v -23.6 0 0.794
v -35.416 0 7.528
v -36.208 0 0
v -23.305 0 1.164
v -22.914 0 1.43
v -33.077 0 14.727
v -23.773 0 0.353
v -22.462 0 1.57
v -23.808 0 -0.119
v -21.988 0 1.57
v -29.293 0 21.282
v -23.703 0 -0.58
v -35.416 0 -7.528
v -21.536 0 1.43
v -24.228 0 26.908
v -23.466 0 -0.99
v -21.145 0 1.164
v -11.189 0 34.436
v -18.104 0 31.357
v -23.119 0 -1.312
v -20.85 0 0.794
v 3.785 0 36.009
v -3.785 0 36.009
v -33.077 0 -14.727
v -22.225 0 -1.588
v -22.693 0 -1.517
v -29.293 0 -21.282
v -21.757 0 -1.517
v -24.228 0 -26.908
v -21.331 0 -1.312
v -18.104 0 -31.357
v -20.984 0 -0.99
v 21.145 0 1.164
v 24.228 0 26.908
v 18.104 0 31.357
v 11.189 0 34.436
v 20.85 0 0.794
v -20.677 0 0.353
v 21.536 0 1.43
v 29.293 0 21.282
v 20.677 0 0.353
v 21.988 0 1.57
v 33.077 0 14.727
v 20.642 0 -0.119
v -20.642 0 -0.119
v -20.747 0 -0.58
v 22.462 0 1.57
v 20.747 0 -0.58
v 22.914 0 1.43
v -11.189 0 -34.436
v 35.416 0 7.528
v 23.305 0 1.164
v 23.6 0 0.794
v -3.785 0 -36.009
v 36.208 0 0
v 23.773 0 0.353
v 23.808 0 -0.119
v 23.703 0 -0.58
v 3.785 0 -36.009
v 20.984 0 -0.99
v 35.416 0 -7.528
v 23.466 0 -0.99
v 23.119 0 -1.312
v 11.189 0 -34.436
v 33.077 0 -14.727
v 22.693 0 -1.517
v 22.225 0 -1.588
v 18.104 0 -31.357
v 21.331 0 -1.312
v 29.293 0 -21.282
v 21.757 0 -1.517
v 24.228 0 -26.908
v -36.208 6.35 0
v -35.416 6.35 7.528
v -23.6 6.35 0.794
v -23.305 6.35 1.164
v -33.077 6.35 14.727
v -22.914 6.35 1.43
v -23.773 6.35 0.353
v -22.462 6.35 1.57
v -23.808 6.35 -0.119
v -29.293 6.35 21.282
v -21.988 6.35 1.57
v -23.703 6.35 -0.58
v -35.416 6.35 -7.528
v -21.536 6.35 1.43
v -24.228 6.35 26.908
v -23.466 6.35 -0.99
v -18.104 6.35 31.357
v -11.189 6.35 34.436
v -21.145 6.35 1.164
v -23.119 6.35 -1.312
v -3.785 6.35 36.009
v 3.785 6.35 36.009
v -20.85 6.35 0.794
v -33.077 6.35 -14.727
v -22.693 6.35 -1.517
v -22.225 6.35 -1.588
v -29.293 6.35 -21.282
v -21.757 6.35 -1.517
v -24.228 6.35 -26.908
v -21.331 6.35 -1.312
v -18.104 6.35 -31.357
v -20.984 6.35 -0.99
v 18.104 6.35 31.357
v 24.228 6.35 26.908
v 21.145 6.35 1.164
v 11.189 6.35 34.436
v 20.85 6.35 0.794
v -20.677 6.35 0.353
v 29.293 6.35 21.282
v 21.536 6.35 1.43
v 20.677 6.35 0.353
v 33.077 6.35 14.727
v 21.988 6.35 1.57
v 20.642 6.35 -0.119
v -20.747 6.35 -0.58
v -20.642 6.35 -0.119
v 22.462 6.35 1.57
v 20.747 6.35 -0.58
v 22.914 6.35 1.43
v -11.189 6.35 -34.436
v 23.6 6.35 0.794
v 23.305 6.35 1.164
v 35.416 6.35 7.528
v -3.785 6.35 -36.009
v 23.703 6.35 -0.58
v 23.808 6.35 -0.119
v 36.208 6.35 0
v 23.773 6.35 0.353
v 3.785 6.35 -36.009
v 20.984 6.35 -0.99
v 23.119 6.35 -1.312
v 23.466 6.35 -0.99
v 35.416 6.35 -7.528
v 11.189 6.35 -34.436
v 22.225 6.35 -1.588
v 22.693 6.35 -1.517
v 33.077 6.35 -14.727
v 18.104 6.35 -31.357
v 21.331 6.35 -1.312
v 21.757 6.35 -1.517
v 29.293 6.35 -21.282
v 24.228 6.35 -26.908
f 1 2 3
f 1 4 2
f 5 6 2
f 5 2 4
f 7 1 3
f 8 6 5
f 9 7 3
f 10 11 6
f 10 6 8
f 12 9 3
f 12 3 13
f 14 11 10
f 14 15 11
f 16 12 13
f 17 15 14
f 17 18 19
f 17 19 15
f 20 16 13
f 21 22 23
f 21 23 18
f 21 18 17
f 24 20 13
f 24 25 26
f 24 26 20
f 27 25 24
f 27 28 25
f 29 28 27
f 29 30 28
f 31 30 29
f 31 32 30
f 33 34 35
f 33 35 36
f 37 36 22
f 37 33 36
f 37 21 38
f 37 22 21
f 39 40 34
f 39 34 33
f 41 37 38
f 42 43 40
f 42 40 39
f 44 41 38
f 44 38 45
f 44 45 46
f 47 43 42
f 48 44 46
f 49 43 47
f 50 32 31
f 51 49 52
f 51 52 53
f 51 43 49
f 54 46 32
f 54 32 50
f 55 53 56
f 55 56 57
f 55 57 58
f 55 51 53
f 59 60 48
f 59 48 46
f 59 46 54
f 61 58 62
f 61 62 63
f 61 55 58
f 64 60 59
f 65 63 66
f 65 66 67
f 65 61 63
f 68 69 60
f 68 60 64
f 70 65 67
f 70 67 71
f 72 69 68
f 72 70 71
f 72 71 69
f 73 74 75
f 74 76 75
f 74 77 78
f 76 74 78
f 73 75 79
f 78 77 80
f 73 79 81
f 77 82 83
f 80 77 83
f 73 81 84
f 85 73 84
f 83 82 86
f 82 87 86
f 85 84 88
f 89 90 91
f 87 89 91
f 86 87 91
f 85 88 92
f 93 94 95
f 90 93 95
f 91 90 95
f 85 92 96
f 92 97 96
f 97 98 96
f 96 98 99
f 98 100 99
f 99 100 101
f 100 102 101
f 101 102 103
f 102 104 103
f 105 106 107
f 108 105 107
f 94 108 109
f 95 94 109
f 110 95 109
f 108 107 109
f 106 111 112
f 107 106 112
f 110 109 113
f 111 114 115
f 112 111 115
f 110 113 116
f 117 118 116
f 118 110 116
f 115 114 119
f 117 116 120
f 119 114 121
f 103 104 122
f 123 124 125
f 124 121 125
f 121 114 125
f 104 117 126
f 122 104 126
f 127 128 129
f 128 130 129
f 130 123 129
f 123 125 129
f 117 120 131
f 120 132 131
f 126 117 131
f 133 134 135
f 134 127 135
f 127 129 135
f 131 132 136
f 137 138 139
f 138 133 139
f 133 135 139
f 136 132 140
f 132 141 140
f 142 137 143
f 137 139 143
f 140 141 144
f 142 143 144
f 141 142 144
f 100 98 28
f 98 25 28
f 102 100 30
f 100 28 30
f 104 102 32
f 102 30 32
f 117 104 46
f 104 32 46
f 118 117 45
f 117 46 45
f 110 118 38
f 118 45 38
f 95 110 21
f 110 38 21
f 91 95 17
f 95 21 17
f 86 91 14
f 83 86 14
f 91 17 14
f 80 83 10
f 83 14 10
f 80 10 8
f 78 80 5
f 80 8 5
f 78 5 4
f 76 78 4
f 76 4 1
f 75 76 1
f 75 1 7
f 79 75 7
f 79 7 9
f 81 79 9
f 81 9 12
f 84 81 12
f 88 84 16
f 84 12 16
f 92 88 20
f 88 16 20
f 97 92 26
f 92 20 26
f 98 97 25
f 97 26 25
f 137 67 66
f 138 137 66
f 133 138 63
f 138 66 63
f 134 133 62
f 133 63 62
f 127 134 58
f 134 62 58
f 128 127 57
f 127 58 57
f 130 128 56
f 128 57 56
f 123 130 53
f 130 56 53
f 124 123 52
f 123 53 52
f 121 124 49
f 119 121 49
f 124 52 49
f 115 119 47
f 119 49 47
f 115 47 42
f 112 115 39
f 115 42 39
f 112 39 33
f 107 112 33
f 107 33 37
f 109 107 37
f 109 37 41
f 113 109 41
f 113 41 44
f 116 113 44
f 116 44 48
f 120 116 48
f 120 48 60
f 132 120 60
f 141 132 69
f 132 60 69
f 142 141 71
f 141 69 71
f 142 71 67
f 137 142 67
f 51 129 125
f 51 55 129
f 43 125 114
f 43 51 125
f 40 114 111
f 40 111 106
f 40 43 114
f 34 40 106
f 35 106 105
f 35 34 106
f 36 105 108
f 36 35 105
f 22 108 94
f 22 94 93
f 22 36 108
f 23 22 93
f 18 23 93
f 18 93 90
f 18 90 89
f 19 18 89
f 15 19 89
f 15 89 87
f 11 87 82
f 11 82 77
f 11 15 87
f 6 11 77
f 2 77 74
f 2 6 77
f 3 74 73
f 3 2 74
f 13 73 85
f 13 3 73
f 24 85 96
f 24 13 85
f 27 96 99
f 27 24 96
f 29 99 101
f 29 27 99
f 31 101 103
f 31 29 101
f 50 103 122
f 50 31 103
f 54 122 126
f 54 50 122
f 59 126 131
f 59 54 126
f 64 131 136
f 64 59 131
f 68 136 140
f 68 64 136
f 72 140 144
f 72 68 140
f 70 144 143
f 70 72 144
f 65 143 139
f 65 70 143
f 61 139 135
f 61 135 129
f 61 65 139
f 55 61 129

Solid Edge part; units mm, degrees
sketch "Sketch1" plane through (0, 0, 0) normal (0, -1, 0) x (1, 0, 0)
  circle A0 centre (0, 0) radius 36.2077
extrude "Protrusion1" add sketch "Sketch1" against normal blind 6.35
extrude "Cutout1" [suppressed]
pattern "Pattern1" [suppressed]
hole "Hole_1" at (-22.225, 0, 0) direction (0, 1, 0) diameter 3.175 end up to next
hole "Hole1" at (22.225, 0, 0) direction (0, 1, 0) diameter 3.175 end up to next
